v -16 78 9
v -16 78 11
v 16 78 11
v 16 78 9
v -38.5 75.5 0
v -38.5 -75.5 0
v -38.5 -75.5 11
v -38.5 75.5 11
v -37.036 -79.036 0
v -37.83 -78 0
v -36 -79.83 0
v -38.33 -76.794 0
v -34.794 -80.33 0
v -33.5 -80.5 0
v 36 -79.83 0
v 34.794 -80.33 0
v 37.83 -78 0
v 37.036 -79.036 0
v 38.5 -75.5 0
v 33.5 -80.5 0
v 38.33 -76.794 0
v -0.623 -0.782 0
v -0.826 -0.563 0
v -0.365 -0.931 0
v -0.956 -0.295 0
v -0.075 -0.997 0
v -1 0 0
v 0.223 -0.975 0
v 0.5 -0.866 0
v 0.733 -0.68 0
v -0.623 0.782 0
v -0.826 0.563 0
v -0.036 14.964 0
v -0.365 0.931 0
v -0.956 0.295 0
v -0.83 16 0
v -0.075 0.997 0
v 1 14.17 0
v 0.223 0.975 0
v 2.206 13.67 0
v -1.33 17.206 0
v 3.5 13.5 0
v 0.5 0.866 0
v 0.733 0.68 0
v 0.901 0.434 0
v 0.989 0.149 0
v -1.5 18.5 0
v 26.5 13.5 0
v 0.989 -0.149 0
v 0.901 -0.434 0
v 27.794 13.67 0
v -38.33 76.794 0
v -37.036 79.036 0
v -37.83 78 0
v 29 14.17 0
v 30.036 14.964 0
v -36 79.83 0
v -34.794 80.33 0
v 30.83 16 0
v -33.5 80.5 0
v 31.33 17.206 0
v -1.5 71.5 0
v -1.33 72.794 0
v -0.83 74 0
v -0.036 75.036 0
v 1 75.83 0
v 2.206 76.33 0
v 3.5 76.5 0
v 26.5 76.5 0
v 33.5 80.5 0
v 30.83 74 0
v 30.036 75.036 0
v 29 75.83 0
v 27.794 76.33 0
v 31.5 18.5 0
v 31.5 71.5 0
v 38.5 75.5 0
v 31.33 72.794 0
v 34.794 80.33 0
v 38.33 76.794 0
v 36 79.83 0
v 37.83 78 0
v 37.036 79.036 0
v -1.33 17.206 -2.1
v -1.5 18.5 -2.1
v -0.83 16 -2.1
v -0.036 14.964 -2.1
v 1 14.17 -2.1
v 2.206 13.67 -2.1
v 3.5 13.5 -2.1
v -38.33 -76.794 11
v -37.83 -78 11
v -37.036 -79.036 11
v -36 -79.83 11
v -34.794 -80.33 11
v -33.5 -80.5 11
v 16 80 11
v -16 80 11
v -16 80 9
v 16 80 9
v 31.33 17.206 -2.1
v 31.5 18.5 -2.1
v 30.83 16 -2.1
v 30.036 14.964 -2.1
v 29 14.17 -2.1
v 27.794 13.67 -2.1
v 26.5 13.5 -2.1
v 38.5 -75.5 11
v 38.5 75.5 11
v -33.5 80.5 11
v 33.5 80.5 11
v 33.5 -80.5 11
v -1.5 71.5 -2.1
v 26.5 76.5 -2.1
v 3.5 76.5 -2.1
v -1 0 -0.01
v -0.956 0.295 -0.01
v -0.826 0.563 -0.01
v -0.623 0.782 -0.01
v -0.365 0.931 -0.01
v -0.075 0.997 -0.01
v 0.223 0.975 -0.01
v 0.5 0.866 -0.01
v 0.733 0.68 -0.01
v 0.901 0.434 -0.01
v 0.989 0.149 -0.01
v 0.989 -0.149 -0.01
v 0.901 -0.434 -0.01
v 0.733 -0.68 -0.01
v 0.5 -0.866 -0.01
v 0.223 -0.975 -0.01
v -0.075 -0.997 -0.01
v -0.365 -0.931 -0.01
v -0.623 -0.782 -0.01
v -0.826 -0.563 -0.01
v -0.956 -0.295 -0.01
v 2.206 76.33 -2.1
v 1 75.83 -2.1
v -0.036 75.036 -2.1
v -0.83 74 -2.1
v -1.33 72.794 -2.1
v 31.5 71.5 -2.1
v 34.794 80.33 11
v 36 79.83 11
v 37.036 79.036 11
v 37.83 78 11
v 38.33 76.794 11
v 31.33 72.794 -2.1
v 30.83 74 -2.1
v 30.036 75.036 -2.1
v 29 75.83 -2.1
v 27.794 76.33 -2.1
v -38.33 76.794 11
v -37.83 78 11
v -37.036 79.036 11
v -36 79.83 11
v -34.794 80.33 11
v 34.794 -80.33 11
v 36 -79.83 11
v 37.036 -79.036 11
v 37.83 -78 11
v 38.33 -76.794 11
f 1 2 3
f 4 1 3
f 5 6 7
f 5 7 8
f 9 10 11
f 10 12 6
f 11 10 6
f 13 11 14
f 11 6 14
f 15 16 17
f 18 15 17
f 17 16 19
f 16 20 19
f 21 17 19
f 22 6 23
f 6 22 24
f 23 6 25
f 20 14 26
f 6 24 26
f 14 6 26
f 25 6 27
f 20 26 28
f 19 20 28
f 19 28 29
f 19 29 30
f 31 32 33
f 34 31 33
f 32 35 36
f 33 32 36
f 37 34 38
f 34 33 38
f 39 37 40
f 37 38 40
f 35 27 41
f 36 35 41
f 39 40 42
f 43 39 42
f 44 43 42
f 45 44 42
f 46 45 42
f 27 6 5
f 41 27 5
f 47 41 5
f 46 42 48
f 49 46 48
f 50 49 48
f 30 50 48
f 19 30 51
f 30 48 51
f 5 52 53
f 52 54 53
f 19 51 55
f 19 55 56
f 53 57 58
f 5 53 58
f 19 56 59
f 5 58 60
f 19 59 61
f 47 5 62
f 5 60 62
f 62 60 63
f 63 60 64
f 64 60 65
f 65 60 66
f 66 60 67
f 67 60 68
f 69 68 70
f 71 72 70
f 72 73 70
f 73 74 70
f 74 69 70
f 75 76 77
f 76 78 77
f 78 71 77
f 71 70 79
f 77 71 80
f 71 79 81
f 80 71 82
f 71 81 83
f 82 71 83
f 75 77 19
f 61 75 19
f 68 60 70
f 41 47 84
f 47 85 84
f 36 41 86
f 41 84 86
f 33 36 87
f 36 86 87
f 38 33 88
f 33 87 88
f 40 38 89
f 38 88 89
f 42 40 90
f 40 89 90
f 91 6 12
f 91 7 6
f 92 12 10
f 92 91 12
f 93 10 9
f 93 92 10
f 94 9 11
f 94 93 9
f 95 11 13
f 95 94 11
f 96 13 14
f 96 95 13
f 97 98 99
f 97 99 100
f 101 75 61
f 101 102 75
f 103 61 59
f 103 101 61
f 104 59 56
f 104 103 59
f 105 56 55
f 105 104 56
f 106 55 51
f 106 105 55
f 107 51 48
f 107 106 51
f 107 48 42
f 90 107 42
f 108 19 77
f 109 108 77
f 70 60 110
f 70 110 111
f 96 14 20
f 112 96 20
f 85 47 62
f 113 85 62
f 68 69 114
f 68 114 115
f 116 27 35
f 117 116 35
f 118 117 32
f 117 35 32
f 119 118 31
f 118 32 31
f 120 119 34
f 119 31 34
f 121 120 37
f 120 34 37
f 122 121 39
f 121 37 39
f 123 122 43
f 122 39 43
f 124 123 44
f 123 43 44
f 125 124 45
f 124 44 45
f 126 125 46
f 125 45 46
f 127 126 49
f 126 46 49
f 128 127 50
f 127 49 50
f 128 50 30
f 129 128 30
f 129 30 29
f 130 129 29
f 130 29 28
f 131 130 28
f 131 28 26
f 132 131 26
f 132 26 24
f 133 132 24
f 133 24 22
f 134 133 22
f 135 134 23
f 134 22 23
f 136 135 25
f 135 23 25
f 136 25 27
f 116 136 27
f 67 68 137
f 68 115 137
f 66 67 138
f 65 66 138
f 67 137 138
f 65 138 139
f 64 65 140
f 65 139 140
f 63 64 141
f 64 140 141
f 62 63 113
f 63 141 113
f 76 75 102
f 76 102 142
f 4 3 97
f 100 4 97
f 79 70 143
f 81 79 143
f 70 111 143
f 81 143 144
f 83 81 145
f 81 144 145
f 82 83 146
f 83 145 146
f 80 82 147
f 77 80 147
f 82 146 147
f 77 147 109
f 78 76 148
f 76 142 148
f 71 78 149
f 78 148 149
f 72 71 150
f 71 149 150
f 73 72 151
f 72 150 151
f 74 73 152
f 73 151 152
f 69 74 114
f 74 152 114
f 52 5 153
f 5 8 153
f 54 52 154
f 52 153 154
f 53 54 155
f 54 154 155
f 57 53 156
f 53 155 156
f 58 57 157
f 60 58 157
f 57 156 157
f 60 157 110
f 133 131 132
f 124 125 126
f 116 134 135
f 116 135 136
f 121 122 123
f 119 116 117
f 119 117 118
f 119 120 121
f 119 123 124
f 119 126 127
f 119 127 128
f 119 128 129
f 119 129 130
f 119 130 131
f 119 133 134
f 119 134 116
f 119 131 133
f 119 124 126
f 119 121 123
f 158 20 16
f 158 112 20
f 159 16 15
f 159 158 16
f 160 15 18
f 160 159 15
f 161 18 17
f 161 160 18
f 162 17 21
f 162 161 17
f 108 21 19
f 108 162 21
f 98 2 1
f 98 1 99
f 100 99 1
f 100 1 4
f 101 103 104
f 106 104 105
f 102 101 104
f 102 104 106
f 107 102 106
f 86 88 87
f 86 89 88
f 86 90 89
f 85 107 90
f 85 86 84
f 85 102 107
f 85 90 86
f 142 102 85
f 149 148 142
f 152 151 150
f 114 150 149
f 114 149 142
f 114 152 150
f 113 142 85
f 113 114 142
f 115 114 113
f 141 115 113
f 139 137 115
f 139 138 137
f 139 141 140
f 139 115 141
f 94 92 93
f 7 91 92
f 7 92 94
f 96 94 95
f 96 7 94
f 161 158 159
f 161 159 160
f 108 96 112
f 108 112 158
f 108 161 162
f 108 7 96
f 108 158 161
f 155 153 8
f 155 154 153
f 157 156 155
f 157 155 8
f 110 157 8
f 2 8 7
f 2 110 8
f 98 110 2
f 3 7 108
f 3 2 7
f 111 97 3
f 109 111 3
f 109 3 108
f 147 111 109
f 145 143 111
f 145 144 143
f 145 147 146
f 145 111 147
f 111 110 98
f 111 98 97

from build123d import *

# Parameters (mm, degrees)
SKETCH_1_W          = 77
SKETCH_1_H          = 161
EXTRUDE_1_DEPTH     = 11
SKETCH_2_W          = 33
SKETCH_2_H          = 63
EXTRUDE_2_DEPTH     = 2.1
FILLET_1_R          = 5
FILLET_2_R          = 5
SKETCH_3_W          = 32
SKETCH_3_H          = 2
CUT_EXTRUDE_1_DEPTH = 2
WRAP_1_OUTLINE_R    = 1
WRAP_1_DEPTH        = 0.01


# Read off the part's stored shape, not the designer's step: 包覆1
with BuildPart() as part:
    # 草图1 → 凸台-拉伸1 (new body)
    with BuildSketch(Plane.XY):
        Rectangle(SKETCH_1_W, SKETCH_1_H)
    extrude(amount=EXTRUDE_1_DEPTH)

    # 草图2 → 凸台-拉伸2 (add)
    with BuildSketch(Plane(origin=(0, 0, 0), x_dir=(-1, 0, 0), z_dir=(0, 0, -1))):
        with Locations((-15, 45)):
            Rectangle(SKETCH_2_W, SKETCH_2_H)
    extrude(amount=EXTRUDE_2_DEPTH)

    # 圆角1
    fillet_1_edges = [part.edges().sort_by_distance(p)[0] for p in [
        (31.5, 76.5, -1.05),
        (31.5, 13.5, -1.05),
        (-1.5, 13.5, -1.05),
        (-1.5, 76.5, -1.05),
    ]]
    fillet(fillet_1_edges, radius=FILLET_1_R)

    # 圆角2
    fillet_2_edges = [part.edges().sort_by_distance(p)[0] for p in [
        (38.5, -80.5, 5.5),
        (-38.5, -80.5, 5.5),
        (-38.5, 80.5, 5.5),
        (38.5, 80.5, 5.5),
    ]]
    fillet(fillet_2_edges, radius=FILLET_2_R)

    # 草图3 → 切除-拉伸1 (cut)
    with BuildSketch(Plane.XY.offset(11)):
        with Locations((0, 79)):
            Rectangle(SKETCH_3_W, SKETCH_3_H)
    extrude(amount=-CUT_EXTRUDE_1_DEPTH, mode=Mode.SUBTRACT)

    # 包覆1 outline → 包覆1 (add)
    with BuildSketch(Plane(origin=(0, 0, 0), x_dir=(-1, 0, 0), z_dir=(0, 0, -1))):
        Circle(WRAP_1_OUTLINE_R)
    extrude(amount=WRAP_1_DEPTH)


solid = part.part
